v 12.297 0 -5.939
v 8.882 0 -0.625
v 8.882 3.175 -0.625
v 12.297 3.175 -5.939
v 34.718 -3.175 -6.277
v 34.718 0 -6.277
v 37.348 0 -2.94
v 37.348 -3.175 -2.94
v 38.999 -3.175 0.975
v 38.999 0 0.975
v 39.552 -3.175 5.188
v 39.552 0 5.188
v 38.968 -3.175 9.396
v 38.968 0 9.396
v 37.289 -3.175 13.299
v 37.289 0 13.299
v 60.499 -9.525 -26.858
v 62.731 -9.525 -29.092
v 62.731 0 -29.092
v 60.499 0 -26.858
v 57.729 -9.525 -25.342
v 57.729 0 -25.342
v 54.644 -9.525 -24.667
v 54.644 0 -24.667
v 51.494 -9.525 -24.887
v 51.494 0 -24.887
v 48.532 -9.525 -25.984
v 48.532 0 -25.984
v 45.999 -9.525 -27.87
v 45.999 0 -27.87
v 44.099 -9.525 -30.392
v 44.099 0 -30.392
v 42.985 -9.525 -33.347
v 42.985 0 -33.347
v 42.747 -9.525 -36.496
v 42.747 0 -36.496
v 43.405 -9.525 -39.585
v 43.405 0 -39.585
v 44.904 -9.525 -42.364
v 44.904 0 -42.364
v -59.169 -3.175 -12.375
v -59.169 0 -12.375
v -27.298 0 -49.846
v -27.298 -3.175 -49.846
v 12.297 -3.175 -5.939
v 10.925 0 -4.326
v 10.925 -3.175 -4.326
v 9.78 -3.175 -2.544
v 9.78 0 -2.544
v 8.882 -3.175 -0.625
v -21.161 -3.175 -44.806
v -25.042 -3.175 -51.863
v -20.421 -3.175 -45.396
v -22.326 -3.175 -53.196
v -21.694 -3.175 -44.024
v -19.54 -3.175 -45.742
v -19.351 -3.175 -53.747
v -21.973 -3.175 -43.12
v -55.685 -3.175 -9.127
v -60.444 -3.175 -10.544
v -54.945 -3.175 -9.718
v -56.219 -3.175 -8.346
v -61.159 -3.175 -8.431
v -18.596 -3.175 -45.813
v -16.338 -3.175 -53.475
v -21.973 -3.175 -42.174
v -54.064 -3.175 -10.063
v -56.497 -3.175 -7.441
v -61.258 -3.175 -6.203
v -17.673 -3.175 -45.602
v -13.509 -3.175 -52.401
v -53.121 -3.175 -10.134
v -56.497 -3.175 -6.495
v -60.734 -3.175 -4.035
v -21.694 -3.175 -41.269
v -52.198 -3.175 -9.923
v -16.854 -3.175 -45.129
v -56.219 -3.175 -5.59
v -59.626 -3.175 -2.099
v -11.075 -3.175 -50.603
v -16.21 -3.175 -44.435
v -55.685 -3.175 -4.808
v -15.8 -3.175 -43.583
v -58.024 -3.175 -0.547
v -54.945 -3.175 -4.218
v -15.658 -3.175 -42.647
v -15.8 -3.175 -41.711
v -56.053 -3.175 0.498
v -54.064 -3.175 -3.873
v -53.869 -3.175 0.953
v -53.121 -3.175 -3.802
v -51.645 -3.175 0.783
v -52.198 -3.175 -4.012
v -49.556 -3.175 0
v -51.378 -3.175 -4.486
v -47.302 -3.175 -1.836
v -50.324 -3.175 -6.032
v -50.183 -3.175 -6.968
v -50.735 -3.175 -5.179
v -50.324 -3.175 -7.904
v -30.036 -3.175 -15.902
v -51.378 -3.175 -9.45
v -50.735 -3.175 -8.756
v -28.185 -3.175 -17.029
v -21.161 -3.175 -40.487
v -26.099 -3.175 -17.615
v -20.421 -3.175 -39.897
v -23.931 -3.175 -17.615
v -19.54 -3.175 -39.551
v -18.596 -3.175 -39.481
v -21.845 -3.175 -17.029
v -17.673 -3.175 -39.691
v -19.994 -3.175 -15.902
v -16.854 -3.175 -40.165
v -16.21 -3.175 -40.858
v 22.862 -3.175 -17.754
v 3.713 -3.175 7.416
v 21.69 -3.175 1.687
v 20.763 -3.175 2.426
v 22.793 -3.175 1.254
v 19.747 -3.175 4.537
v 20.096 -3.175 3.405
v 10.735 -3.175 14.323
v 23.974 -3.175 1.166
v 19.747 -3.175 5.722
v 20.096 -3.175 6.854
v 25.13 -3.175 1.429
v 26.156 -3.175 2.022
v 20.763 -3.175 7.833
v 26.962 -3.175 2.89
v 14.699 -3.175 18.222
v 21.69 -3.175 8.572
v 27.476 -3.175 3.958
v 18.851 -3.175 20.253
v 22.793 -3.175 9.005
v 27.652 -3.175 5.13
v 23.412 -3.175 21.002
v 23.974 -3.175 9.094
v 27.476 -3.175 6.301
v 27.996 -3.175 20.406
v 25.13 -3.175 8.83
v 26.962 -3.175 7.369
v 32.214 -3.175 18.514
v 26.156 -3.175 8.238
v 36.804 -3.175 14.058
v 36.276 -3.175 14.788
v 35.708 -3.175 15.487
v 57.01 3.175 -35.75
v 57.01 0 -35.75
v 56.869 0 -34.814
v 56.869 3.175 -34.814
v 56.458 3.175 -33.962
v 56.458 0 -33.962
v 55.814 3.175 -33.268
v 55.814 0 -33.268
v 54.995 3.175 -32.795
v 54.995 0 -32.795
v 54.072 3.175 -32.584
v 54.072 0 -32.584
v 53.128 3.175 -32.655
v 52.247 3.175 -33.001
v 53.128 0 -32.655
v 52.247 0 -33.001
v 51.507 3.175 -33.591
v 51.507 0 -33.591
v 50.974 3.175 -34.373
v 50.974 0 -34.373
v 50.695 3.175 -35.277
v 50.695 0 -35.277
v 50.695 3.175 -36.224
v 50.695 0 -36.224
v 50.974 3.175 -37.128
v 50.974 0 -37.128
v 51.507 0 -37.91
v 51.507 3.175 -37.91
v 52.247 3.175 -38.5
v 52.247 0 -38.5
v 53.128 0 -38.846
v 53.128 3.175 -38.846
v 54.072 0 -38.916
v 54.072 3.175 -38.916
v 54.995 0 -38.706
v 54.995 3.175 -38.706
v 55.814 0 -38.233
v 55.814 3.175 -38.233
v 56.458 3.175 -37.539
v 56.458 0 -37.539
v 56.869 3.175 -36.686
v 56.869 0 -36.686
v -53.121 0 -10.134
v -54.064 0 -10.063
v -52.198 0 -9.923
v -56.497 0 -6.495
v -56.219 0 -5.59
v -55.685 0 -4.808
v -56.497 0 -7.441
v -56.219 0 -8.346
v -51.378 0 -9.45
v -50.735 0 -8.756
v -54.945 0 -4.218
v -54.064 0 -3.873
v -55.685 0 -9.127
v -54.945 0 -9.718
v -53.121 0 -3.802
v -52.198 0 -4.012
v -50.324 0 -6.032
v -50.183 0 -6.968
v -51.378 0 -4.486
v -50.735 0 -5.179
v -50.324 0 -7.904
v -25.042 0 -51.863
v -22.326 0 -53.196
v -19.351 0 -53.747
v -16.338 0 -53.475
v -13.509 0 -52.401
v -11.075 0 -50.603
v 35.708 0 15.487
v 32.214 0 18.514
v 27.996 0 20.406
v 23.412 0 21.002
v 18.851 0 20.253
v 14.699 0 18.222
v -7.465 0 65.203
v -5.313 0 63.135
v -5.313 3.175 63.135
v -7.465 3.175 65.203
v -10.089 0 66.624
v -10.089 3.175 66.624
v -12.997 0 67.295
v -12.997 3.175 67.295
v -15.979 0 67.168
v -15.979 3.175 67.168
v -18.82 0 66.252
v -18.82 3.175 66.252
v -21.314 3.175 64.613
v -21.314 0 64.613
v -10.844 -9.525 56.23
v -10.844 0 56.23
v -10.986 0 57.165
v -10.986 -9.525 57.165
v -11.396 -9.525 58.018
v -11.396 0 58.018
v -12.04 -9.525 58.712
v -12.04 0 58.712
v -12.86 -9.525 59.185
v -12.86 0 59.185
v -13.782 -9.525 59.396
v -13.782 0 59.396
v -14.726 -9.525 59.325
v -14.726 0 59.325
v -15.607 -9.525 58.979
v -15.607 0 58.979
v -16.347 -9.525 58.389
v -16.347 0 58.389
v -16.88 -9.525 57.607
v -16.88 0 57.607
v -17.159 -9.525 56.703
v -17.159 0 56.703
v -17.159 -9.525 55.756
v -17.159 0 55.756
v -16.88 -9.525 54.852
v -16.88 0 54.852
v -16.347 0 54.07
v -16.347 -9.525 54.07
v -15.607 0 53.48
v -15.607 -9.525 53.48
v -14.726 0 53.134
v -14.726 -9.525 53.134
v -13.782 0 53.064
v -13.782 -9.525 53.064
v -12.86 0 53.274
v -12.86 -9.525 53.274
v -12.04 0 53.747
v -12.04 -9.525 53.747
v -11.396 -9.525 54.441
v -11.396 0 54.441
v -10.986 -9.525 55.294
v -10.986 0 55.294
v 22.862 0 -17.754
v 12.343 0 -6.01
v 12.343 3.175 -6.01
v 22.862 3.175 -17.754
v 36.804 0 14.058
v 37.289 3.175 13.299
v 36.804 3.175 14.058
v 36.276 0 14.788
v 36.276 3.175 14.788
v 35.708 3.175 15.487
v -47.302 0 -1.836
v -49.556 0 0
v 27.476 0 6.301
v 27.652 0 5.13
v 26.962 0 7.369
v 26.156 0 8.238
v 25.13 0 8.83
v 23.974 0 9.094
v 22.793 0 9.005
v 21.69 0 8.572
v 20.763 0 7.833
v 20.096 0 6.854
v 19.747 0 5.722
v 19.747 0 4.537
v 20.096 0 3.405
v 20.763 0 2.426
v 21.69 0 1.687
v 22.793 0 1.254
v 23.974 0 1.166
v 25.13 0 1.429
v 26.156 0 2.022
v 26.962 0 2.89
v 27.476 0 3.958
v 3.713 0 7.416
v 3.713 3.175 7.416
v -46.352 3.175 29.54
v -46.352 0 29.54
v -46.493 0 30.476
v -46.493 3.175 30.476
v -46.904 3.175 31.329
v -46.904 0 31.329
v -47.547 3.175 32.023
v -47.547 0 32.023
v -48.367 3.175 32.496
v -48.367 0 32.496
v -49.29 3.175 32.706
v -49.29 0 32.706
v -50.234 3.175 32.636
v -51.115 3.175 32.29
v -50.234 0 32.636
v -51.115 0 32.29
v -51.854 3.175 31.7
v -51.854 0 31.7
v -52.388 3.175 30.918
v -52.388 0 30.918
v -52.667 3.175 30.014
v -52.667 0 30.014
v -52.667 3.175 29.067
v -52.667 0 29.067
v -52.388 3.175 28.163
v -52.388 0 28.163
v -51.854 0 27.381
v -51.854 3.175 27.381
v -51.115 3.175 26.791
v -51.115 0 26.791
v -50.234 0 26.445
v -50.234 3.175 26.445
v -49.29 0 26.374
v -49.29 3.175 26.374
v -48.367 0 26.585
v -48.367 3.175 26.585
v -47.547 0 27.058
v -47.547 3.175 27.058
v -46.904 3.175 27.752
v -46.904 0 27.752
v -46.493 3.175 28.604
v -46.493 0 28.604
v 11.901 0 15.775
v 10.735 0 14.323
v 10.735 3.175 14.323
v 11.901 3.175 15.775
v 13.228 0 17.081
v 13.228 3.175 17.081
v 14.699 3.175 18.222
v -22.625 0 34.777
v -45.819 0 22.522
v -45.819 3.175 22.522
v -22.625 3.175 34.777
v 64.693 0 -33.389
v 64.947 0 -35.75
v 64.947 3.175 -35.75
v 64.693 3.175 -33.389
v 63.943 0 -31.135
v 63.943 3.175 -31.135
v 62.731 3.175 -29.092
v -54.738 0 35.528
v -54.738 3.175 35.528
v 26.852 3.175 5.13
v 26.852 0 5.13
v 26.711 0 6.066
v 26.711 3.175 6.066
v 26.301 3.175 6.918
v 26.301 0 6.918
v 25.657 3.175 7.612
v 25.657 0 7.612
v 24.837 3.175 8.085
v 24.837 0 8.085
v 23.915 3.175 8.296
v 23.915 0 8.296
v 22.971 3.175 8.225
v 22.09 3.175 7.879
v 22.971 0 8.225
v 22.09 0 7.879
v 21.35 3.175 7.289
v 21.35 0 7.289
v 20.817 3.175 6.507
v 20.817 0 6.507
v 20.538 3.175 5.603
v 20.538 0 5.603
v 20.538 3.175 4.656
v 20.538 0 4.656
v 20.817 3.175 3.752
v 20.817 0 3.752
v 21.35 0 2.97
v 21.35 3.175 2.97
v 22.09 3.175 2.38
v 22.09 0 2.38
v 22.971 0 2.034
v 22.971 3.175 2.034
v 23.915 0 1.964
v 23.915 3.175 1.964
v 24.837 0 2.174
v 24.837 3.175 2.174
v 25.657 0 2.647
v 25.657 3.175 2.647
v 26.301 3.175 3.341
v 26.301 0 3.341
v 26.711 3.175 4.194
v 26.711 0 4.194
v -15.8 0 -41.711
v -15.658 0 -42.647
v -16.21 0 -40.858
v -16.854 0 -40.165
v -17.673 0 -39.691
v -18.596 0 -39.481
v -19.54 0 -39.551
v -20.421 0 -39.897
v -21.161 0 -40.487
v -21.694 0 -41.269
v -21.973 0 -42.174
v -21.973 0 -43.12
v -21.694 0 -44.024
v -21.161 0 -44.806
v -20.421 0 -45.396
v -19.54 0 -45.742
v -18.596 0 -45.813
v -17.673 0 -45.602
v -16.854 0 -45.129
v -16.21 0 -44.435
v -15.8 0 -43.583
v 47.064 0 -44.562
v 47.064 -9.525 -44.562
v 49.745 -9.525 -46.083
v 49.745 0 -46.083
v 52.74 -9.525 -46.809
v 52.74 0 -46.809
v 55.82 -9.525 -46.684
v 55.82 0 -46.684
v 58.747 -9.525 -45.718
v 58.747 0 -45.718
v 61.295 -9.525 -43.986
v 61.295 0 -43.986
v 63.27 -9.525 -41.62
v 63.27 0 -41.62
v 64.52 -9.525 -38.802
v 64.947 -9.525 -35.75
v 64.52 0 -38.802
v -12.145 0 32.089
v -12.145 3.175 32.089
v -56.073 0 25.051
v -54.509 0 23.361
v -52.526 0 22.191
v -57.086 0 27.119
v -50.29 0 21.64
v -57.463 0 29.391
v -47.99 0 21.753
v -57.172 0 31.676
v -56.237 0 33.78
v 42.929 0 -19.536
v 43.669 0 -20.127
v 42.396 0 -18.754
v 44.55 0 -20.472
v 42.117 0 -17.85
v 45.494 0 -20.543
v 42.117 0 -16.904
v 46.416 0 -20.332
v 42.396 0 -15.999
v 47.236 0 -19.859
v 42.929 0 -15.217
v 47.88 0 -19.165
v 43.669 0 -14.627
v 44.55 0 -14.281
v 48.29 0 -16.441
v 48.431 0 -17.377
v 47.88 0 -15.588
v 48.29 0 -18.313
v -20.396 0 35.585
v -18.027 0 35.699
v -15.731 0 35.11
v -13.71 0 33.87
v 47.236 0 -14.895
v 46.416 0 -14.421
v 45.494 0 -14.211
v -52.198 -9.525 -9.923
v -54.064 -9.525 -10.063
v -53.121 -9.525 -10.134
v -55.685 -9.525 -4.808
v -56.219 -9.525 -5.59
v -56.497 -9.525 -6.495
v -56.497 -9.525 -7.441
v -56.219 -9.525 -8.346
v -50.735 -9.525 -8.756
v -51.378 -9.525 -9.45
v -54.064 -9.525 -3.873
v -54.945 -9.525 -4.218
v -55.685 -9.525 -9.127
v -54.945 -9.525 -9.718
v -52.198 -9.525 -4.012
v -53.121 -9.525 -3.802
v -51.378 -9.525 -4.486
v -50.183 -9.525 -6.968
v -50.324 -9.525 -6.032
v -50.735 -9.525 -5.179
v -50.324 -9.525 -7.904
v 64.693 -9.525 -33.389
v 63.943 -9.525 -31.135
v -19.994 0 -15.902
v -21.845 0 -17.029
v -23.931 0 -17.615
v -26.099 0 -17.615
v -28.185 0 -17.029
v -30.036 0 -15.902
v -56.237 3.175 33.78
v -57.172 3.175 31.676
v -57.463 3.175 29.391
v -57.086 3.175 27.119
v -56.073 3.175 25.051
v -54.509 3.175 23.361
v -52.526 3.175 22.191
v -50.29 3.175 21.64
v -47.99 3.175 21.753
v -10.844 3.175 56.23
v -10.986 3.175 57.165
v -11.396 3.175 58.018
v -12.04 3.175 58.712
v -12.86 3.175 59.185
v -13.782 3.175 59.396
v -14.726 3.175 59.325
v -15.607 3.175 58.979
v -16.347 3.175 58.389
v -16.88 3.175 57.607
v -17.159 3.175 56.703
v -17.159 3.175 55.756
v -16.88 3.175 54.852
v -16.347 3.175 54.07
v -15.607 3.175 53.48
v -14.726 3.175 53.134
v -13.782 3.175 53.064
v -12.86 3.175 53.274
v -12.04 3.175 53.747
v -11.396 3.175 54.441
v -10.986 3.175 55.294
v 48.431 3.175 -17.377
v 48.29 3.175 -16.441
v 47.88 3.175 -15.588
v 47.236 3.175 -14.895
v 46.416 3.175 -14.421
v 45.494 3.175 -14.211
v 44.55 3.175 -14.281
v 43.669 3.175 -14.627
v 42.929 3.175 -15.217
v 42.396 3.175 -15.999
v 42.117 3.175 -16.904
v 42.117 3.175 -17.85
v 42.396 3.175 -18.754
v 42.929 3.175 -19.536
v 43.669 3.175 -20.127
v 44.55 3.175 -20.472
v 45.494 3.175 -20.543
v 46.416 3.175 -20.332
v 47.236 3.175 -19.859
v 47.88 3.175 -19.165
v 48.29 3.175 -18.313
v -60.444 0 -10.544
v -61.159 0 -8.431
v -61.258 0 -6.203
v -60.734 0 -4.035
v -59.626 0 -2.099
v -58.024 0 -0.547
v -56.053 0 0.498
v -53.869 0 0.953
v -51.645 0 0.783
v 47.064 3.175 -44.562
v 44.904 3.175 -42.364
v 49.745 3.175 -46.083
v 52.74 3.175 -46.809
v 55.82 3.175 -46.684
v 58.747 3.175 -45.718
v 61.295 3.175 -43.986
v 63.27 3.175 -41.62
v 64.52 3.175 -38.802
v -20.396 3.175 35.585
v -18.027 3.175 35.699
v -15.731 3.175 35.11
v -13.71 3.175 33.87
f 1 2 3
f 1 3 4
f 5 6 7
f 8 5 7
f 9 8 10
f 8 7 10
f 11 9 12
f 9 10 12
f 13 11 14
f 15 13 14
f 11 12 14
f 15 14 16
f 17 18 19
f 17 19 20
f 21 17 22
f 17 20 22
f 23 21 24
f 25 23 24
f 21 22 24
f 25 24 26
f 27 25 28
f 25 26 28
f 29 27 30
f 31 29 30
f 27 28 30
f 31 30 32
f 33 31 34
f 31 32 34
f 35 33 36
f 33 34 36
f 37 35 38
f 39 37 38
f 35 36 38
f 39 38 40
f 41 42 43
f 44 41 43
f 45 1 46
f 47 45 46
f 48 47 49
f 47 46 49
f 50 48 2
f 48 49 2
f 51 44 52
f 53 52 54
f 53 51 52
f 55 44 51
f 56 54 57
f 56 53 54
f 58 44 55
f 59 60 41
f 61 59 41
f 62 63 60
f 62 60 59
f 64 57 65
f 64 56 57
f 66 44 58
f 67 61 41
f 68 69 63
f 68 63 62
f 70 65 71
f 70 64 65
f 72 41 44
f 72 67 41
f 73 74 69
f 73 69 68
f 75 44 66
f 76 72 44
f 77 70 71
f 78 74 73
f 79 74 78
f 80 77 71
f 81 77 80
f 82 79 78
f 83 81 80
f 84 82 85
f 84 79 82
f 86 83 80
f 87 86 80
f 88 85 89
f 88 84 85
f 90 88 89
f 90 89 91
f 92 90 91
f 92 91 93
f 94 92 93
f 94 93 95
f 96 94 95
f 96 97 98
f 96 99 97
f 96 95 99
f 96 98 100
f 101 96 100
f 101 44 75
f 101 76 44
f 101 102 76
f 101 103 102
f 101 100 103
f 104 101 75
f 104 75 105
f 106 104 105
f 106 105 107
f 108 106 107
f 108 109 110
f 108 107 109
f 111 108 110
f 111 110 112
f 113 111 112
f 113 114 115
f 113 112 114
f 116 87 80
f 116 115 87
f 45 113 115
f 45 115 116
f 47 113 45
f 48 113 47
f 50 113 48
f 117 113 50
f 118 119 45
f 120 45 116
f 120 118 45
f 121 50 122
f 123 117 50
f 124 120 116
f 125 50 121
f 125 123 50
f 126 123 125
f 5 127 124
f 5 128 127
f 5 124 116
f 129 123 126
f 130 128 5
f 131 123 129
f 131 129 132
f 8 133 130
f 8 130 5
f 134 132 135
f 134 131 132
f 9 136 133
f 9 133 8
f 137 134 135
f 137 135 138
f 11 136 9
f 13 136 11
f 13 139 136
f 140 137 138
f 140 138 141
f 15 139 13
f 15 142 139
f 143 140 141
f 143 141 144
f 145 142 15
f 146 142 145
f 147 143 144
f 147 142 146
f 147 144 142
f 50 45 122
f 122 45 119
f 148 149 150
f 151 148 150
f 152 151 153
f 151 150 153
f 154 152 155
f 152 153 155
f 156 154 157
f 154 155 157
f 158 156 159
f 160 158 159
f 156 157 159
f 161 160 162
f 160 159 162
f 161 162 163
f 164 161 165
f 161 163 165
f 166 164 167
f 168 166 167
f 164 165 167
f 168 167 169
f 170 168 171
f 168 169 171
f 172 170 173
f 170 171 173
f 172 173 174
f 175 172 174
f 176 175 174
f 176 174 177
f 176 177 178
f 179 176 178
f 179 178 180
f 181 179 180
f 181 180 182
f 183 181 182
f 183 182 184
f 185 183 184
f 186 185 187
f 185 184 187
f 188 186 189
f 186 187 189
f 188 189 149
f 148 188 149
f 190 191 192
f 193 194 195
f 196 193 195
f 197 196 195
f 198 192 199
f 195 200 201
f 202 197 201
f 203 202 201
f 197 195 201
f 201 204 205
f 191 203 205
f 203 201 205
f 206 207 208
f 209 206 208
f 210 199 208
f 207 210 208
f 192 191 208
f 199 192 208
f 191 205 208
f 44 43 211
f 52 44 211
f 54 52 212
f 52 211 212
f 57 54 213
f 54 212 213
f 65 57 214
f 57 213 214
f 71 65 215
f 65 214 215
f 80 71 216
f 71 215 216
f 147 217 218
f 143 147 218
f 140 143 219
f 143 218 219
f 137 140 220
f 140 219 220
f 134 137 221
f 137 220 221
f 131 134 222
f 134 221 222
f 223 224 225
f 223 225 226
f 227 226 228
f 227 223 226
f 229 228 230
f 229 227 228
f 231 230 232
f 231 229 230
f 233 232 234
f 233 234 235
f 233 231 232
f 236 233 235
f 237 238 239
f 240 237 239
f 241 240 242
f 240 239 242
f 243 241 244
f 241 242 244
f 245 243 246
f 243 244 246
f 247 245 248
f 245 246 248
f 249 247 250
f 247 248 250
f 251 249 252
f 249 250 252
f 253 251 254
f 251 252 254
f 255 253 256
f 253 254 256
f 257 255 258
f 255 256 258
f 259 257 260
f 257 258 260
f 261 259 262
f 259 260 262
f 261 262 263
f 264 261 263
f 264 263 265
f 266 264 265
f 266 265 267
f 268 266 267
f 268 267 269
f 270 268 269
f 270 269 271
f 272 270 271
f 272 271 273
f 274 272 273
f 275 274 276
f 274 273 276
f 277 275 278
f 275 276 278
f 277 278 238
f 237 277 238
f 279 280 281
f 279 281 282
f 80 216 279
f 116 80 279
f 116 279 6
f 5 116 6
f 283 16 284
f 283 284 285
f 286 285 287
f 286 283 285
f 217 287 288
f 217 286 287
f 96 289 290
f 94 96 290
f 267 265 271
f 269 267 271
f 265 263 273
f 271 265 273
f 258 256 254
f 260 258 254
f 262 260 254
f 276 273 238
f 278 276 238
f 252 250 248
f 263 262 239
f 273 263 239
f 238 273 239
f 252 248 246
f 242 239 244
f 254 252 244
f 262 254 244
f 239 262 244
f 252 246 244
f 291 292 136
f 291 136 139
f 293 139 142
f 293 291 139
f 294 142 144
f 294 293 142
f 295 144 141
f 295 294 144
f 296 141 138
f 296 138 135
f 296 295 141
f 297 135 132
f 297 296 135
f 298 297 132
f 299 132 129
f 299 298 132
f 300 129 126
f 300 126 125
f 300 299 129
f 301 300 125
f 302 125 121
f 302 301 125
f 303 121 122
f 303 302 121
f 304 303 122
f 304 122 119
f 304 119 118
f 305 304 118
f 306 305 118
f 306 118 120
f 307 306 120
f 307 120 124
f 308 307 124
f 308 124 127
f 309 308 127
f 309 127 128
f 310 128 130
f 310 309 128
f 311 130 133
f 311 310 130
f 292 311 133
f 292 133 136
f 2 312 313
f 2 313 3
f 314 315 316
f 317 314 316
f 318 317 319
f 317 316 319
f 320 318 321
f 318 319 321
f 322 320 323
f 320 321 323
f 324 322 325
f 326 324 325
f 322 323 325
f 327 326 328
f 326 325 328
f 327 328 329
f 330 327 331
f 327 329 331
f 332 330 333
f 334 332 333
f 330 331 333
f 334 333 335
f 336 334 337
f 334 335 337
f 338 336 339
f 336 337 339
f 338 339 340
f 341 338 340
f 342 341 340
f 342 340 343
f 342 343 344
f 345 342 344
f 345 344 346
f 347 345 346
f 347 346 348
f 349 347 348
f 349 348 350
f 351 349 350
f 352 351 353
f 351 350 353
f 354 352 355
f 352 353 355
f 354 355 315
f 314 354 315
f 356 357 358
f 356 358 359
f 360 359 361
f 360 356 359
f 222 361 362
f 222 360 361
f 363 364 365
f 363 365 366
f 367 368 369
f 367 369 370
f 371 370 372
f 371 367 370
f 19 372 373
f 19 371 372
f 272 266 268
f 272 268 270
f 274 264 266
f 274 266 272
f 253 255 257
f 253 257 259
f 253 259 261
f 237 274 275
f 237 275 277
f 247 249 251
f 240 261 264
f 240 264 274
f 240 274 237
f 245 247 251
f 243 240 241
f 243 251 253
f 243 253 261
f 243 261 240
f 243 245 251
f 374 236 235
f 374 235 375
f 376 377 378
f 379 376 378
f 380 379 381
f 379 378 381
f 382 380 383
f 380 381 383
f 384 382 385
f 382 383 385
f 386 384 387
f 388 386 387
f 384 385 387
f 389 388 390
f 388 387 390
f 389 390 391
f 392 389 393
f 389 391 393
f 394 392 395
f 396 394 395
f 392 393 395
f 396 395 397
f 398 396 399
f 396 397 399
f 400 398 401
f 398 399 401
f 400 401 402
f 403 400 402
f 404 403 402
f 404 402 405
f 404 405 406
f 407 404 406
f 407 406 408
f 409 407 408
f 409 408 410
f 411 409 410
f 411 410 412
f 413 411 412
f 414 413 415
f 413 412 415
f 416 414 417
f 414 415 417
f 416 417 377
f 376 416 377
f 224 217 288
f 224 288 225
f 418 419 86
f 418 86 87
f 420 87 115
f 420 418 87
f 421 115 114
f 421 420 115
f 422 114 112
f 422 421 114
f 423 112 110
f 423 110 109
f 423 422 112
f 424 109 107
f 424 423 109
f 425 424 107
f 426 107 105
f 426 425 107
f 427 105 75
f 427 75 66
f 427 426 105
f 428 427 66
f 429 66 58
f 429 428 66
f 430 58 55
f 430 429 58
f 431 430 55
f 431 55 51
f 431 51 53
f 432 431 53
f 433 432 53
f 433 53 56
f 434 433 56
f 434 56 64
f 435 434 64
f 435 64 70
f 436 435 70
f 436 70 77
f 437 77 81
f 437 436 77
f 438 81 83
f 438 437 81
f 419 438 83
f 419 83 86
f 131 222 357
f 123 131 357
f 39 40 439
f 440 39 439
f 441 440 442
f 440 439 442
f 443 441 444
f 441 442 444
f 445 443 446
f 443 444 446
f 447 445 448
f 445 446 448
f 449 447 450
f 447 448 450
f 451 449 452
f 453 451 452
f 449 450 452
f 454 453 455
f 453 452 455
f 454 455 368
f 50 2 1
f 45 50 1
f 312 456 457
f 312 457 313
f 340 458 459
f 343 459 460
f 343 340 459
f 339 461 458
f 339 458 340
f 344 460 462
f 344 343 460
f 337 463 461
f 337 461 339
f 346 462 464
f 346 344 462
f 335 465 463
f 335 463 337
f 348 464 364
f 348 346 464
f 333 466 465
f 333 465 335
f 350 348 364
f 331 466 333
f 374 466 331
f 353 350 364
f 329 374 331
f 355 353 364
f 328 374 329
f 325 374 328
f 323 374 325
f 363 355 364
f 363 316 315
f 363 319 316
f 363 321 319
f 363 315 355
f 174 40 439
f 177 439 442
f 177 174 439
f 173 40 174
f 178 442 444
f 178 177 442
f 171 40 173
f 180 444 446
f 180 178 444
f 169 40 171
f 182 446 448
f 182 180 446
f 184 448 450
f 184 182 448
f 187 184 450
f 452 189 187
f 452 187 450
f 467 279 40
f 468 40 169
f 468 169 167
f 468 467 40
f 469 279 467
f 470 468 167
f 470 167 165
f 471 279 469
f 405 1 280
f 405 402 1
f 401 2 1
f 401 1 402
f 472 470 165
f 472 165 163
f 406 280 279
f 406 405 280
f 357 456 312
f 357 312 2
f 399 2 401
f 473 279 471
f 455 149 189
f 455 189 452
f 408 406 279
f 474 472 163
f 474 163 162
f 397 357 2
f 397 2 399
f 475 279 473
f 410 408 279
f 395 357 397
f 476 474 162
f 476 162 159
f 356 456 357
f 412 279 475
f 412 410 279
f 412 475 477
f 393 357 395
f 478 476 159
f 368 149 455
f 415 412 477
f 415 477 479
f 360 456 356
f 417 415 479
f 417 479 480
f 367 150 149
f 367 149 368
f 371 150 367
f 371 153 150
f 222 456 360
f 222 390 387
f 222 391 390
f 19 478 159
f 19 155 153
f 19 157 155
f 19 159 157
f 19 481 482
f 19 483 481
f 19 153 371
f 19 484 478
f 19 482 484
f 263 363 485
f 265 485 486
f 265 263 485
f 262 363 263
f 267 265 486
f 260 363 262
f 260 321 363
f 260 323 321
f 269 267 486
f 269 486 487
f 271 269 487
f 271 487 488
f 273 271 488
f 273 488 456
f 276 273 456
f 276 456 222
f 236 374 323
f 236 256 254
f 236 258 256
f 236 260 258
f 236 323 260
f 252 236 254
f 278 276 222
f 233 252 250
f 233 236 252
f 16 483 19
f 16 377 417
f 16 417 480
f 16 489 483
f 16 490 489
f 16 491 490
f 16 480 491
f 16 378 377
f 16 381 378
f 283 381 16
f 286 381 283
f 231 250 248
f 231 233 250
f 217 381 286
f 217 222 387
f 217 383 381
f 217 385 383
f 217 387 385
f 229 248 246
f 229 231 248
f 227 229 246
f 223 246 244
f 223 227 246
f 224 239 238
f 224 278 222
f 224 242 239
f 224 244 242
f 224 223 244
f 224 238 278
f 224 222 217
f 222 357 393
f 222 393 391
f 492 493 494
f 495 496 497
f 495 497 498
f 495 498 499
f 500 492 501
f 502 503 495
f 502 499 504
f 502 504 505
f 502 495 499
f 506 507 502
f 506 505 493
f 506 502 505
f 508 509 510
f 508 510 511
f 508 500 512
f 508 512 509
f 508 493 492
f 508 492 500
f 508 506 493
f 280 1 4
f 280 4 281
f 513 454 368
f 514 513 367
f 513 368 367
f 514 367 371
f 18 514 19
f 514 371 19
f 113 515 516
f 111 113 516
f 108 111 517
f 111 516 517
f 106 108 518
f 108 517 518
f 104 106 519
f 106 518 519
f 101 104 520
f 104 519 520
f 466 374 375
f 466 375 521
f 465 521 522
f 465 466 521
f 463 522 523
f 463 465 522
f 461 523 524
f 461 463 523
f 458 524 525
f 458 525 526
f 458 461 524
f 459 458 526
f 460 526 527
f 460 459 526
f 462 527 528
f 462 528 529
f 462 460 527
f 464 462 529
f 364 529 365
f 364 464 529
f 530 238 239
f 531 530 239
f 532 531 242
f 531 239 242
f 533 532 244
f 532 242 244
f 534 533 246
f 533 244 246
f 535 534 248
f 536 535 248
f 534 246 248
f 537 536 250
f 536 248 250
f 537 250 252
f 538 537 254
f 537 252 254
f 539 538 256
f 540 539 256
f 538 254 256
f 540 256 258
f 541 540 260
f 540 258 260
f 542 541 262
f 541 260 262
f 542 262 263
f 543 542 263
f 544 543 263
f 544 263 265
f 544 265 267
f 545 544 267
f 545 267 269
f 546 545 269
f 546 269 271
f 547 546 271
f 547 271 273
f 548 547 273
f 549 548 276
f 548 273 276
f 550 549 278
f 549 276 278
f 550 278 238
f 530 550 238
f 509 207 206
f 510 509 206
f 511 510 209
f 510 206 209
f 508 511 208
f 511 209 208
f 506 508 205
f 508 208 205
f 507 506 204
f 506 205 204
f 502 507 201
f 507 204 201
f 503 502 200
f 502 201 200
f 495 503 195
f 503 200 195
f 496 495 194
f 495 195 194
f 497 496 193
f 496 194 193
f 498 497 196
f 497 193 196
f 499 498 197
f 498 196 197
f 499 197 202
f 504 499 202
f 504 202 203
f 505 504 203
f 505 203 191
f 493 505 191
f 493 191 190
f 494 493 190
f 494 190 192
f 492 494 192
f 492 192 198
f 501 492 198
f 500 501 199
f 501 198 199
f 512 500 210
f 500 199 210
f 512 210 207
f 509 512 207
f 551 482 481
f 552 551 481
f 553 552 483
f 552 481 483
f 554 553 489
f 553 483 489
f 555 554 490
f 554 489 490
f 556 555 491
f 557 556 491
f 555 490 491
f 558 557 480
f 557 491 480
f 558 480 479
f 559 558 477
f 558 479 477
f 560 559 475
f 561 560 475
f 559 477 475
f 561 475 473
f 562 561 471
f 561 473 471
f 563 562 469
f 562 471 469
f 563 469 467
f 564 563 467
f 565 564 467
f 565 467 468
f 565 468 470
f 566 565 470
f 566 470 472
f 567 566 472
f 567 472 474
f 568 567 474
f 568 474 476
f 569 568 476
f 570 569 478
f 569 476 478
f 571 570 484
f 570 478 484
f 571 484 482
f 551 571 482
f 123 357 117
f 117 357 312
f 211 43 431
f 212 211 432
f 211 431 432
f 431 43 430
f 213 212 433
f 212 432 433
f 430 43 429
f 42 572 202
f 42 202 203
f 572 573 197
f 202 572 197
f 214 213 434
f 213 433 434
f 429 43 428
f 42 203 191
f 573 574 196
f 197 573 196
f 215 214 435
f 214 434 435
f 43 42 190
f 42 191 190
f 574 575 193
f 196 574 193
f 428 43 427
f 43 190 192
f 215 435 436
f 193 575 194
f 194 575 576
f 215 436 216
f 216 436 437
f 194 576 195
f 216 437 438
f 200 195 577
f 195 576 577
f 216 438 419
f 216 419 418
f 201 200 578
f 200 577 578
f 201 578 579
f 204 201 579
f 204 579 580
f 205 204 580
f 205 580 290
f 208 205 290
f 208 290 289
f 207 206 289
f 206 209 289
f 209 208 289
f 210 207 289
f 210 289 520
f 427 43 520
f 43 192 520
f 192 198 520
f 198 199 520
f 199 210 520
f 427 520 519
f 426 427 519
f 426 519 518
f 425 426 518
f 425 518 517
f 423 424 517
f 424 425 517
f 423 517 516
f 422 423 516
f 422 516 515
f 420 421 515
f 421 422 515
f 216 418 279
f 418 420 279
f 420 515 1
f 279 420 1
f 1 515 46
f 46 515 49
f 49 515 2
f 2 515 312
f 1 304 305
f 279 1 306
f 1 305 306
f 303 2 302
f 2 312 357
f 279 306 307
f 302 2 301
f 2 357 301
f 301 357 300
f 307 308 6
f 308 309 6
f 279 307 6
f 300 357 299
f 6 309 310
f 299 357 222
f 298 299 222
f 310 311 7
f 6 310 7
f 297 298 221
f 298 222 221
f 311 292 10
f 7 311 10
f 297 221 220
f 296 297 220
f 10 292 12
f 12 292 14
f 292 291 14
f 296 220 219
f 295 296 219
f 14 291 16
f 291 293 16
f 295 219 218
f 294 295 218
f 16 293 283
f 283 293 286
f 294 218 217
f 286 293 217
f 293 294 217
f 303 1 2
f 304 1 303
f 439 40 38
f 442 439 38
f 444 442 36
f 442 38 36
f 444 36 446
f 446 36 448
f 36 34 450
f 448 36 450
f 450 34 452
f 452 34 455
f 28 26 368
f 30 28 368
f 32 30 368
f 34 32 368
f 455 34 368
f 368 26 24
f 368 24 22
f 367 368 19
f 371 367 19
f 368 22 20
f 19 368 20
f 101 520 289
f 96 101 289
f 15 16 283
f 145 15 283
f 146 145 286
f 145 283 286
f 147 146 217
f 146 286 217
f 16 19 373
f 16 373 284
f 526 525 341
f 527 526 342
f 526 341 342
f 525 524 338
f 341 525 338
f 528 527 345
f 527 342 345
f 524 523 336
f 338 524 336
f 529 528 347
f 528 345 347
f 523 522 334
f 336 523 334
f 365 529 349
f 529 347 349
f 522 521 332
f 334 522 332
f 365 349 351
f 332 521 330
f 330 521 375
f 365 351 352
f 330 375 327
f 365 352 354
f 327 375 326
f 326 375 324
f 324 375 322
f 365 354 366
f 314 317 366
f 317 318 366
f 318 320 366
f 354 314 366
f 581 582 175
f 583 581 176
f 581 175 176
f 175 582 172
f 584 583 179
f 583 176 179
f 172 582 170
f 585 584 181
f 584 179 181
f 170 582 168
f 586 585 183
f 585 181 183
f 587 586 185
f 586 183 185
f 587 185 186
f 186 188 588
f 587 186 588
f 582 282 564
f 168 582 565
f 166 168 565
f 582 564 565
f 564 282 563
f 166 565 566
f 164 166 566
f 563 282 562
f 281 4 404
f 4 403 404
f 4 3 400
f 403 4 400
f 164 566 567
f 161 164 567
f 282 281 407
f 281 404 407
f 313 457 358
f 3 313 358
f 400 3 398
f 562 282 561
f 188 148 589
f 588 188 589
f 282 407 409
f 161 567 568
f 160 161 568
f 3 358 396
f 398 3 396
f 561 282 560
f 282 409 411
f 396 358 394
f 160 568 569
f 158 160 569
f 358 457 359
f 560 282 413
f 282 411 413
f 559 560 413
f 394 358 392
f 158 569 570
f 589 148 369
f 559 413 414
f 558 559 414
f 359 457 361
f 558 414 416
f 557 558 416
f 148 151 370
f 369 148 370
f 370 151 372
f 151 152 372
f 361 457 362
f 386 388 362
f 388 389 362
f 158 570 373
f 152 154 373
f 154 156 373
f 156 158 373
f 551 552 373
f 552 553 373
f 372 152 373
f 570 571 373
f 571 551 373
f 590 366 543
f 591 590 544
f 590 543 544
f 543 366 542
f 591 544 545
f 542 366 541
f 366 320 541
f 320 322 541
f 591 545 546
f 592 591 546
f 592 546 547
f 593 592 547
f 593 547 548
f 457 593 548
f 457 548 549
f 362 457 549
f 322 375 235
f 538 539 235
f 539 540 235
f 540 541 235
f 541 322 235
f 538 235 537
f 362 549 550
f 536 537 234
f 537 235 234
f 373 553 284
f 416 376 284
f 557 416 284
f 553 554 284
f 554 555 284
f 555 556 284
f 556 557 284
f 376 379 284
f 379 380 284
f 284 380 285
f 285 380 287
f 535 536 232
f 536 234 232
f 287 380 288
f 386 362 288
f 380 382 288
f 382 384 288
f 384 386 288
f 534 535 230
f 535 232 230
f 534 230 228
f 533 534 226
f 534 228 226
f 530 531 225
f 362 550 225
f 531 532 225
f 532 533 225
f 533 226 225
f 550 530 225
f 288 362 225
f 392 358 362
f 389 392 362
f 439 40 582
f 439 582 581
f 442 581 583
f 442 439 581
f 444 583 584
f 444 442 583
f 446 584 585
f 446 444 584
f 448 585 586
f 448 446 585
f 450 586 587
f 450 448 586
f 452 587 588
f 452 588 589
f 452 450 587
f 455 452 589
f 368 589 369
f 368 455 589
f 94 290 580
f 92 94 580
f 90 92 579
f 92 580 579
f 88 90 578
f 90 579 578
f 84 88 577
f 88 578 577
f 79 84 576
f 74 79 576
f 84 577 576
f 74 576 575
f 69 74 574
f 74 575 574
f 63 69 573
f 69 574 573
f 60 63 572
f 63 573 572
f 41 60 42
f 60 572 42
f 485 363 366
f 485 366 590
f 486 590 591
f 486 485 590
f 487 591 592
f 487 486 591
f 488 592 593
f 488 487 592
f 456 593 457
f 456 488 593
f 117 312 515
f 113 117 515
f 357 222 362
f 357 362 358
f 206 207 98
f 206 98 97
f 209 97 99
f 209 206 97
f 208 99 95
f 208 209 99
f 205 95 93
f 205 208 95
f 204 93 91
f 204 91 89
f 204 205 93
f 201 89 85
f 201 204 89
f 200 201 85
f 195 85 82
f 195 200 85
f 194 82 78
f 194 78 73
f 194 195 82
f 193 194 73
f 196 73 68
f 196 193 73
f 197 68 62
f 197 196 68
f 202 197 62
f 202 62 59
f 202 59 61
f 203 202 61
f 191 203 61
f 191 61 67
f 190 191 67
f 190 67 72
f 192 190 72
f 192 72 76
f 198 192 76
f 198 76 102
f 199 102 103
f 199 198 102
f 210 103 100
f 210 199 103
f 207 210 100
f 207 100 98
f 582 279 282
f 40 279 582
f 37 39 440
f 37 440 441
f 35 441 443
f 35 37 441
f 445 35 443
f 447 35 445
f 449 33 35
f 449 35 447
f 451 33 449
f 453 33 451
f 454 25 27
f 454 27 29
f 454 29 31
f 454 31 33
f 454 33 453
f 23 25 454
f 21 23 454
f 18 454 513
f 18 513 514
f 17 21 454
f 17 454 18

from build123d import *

# Parameters (mm, degrees)
F0_R     = 3.9751
F0_R_2   = 3.175
F1_DEPTH = 3.175
F2_DEPTH = 3.175
F4_DEPTH = 9.525


with BuildPart() as f1:
    # F0 (on Front) → F1 (new body)
    with BuildSketch(Plane.XZ):
        with BuildLine():
            ThreePointArc((-5.3127557425, 63.1347790551), (-3.525631751, 59.8857583818), (-2.9069614474, 56.2296409669))
            ThreePointArc((-2.9069614474, 56.2296409669), (-18.6251583345, 46.116520161), (-21.3141987809, 64.6126275161))
            Line((-21.3141987809, 64.6126275161), (-54.737529258, 35.5281937994))
            ThreePointArc((-54.737529258, 35.5281937994), (-46.2372191005, 36.7640039827), (-41.5895025912, 29.5403462642))
            ThreePointArc((-41.5895025912, 29.5403462642), (-42.7285574594, 25.4433900722), (-45.8188065382, 22.5222846884))
            Line((-45.8188065382, 22.5222846884), (-22.625150159, 34.7773246467))
            ThreePointArc((-22.625150159, 34.7773246467), (-16.8569045119, 35.4909788107), (-12.144523957, 32.088710506))
            Line((-12.144523957, 32.088710506), (3.7133936542, 7.4163528596))
            Line((3.7133936542, 7.4163528596), (10.7353477508, 14.3232909653))
            ThreePointArc((10.7353477508, 14.3232909653), (12.5449977515, 16.4472846117), (14.6985856273, 18.2216130469))
            ThreePointArc((14.6985856273, 18.2216130469), (25.7261792861, 20.8718790141), (35.7079737596, 15.487131045))
            Line((35.7079737596, 15.487131045), (-5.3127557425, 63.1347790551))
        make_face()
        with BuildLine():
            ThreePointArc((37.2888219021, 13.2991536525), (36.5449865014, 14.4268033973), (35.7079737596, 15.487131045))
            ThreePointArc((35.7079737596, 15.487131045), (25.7261792861, 20.8718790141), (14.6985856273, 18.2216130469))
            Line((14.6985856273, 18.2216130469), (10.7353477508, 14.3232909653))
            ThreePointArc((10.7353477508, 14.3232909653), (7.9228485059, 7.0827485045), (8.8821439076, -0.6253874221))
            Line((8.8821439076, -0.6253874221), (12.2974068631, -5.9389847782))
            ThreePointArc((12.2974068631, -5.9389847782), (23.4379734075, -10.743537999), (34.718293483, -6.2769583705))
            ThreePointArc((34.718293483, -6.2769583705), (38.2938852735, -1.0646535641), (39.5522467868, 5.1296586938))
            ThreePointArc((39.5522467868, 5.1296586938), (38.9759294091, 9.3682828836), (37.2888219021, 13.2991536525))
        make_face()
        with Locations((23.6772467868, 5.1296586938)):
            Circle(F0_R, mode=Mode.SUBTRACT)
        with BuildLine():
            Line((62.7313325952, -29.0917955033), (37.2888219021, 13.2991536525))
            ThreePointArc((37.2888219021, 13.2991536525), (38.9759294091, 9.3682828836), (39.5522467868, 5.1296586938))
            ThreePointArc((39.5522467868, 5.1296586938), (38.2938852735, -1.0646535641), (34.718293483, -6.2769583705))
            Line((34.718293483, -6.2769583705), (22.861570702, -17.7536858036))
            Line((22.861570702, -17.7536858036), (44.9044808209, -42.3639788264))
            ThreePointArc((44.9044808209, -42.3639788264), (47.1985006827, -26.8368729907), (62.7313325952, -29.0917955033))
        make_face()
        with Locations((45.2562570572, -17.3768736422)):
            Circle(F0_R_2, mode=Mode.SUBTRACT)
        with BuildLine():
            ThreePointArc((64.9471133741, -35.7503271246), (64.3786270453, -32.2415621064), (62.7313325952, -29.0917955033))
            ThreePointArc((62.7313325952, -29.0917955033), (47.1985006827, -26.8368729907), (44.9044808209, -42.3639788264))
            ThreePointArc((44.9044808209, -42.3639788264), (57.3168223176, -46.3031408311), (64.9471133741, -35.7503271246))
        make_face()
        with Locations((53.8346133741, -35.7503271246)):
            Circle(F0_R_2, mode=Mode.SUBTRACT)
        with BuildLine():
            ThreePointArc((-21.3141987809, 64.6126275161), (-18.6251583345, 46.116520161), (-2.9069614474, 56.2296409669))
            ThreePointArc((-2.9069614474, 56.2296409669), (-3.525631751, 59.8857583818), (-5.3127557425, 63.1347790551))
            ThreePointArc((-5.3127557425, 63.1347790551), (-12.9974914435, 67.295048034), (-21.3141987809, 64.6126275161))
        make_face()
        with Locations((-14.0194614474, 56.2296409669)):
            Circle(F0_R_2, mode=Mode.SUBTRACT)
        with BuildLine():
            ThreePointArc((-41.5895025912, 29.5403462642), (-46.2372191005, 36.7640039827), (-54.737529258, 35.5281937994))
            ThreePointArc((-54.737529258, 35.5281937994), (-56.0731974607, 25.0513331231), (-45.8188065382, 22.5222846884))
            ThreePointArc((-45.8188065382, 22.5222846884), (-42.7285574594, 25.4433900722), (-41.5895025912, 29.5403462642))
        make_face()
        with Locations((-49.5270025912, 29.5403462642)):
            Circle(F0_R_2, mode=Mode.SUBTRACT)
        with BuildLine():
            Line((22.861570702, -17.7536858036), (34.718293483, -6.2769583705))
            ThreePointArc((34.718293483, -6.2769583705), (23.4379734075, -10.743537999), (12.2974068631, -5.9389847782))
            Line((12.2974068631, -5.9389847782), (12.3431713564, -6.0101869358))
            Line((12.3431713564, -6.0101869358), (22.861570702, -17.7536858036))
        make_face()
        with Locations((23.6772467868, 5.1296586938)):
            Circle(F0_R)
        with Locations((23.6772467868, 5.1296586938)):
            Circle(F0_R_2, mode=Mode.SUBTRACT)
        with BuildLine():
            ThreePointArc((8.8821439076, -0.6253874221), (7.9228485059, 7.0827485045), (10.7353477508, 14.3232909653))
            Line((10.7353477508, 14.3232909653), (3.7133936542, 7.4163528596))
            Line((3.7133936542, 7.4163528596), (8.8821439076, -0.6253874221))
        make_face()
    extrude(amount=-F1_DEPTH)


with BuildPart() as f2:
    # F0 (on Front) → F2 (new body)
    with BuildSketch(Plane.XZ):
        with BuildLine():
            ThreePointArc((37.2888219021, 13.2991536525), (36.5449865014, 14.4268033973), (35.7079737596, 15.487131045))
            ThreePointArc((35.7079737596, 15.487131045), (25.7261792861, 20.8718790141), (14.6985856273, 18.2216130469))
            Line((14.6985856273, 18.2216130469), (10.7353477508, 14.3232909653))
            ThreePointArc((10.7353477508, 14.3232909653), (7.9228485059, 7.0827485045), (8.8821439076, -0.6253874221))
            Line((8.8821439076, -0.6253874221), (12.2974068631, -5.9389847782))
            ThreePointArc((12.2974068631, -5.9389847782), (23.4379734075, -10.743537999), (34.718293483, -6.2769583705))
            ThreePointArc((34.718293483, -6.2769583705), (38.2938852735, -1.0646535641), (39.5522467868, 5.1296586938))
            ThreePointArc((39.5522467868, 5.1296586938), (38.9759294091, 9.3682828836), (37.2888219021, 13.2991536525))
        make_face()
        with Locations((23.6772467868, 5.1296586938)):
            Circle(F0_R, mode=Mode.SUBTRACT)
        with BuildLine():
            ThreePointArc((8.8821439076, -0.6253874221), (7.9228485059, 7.0827485045), (10.7353477508, 14.3232909653))
            Line((10.7353477508, 14.3232909653), (3.7133936542, 7.4163528596))
            Line((3.7133936542, 7.4163528596), (8.8821439076, -0.6253874221))
        make_face()
        with BuildLine():
            Line((22.861570702, -17.7536858036), (34.718293483, -6.2769583705))
            ThreePointArc((34.718293483, -6.2769583705), (23.4379734075, -10.743537999), (12.2974068631, -5.9389847782))
            Line((12.2974068631, -5.9389847782), (12.3431713564, -6.0101869358))
            Line((12.3431713564, -6.0101869358), (22.861570702, -17.7536858036))
        make_face()
        with BuildLine():
            ThreePointArc((12.2974068631, -5.9389847782), (10.3228285329, -3.45376359), (8.8821439076, -0.6253874221))
            Line((8.8821439076, -0.6253874221), (3.7133936542, 7.4163528596))
            Line((3.7133936542, 7.4163528596), (-19.9936484697, -15.9023801261))
            ThreePointArc((-19.9936484697, -15.9023801261), (-25.0150598586, -17.6888874259), (-30.0364712475, -15.9023801261))
            Line((-30.0364712475, -15.9023801261), (-47.3022995151, -1.8363273688))
            ThreePointArc((-47.3022995151, -1.8363273688), (-45.9057292748, -4.2350360326), (-45.4204246014, -6.9679266385))
            ThreePointArc((-45.4204246014, -6.9679266385), (-50.4530203401, -14.3547688247), (-59.1691962507, -12.3746842684))
            Line((-59.1691962507, -12.3746842684), (-27.2982812561, -49.8464654343))
            ThreePointArc((-27.2982812561, -49.8464654343), (-25.8826153725, -34.0563496428), (-10.1199282001, -35.7503271246))
            ThreePointArc((-10.1199282001, -35.7503271246), (-8.3378155575, -38.995927856), (-7.7209494347, -42.6468627726))
            ThreePointArc((-7.7209494347, -42.6468627726), (-8.3378155575, -46.2977976891), (-10.1199282001, -49.5433984205))
            ThreePointArc((-10.1199282001, -49.5433984205), (-10.5806264467, -50.0885406061), (-11.0753700137, -50.6029836833))
            Line((-11.0753700137, -50.6029836833), (22.861570702, -17.7536858036))
            Line((22.861570702, -17.7536858036), (12.3431713564, -6.0101869358))
            Line((12.3431713564, -6.0101869358), (12.2974068631, -5.9389847782))
        make_face()
        with BuildLine():
            Line((-10.1199282001, -35.7503271246), (-10.1199282001, -49.5433984205))
            ThreePointArc((-10.1199282001, -49.5433984205), (-8.3378155575, -46.2977976891), (-7.7209494347, -42.6468627726))
            ThreePointArc((-7.7209494347, -42.6468627726), (-8.3378155575, -38.995927856), (-10.1199282001, -35.7503271246))
        make_face()
        with BuildLine():
            ThreePointArc((-27.2982812561, -49.8464654343), (-19.3510928488, -53.7472997705), (-11.0753700137, -50.6029836833))
            ThreePointArc((-11.0753700137, -50.6029836833), (-10.5806264467, -50.0885406061), (-10.1199282001, -49.5433984205))
            Line((-10.1199282001, -49.5433984205), (-10.1199282001, -35.7503271246))
            ThreePointArc((-10.1199282001, -35.7503271246), (-25.8826153725, -34.0563496428), (-27.2982812561, -49.8464654343))
        make_face()
        with Locations((-18.8334494347, -42.6468627726)):
            Circle(F0_R_2, mode=Mode.SUBTRACT)
        with BuildLine():
            ThreePointArc((-45.4204246014, -6.9679266385), (-45.9057292748, -4.2350360326), (-47.3022995151, -1.8363273688))
            Line((-47.3022995151, -1.8363273688), (-49.556358528, 0))
            ThreePointArc((-49.556358528, 0), (-59.6263320396, -2.0985350504), (-59.1691962507, -12.3746842684))
            ThreePointArc((-59.1691962507, -12.3746842684), (-50.4530203401, -14.3547688247), (-45.4204246014, -6.9679266385))
        make_face()
        with Locations((-53.3579246014, -6.9679266385)):
            Circle(F0_R_2, mode=Mode.SUBTRACT)
    extrude(amount=F2_DEPTH)


with BuildPart() as f4:
    # F0 (on Front) → F4 (new body, through all)
    with BuildSketch(Plane.XZ):
        with Locations((-14.0194614474, 56.2296409669)):
            Circle(F0_R_2)
    extrude(amount=F4_DEPTH)


with BuildPart() as f4b:
    # F0 (on Front) → F4, piece 2 (new body, through all)
    with BuildSketch(Plane.XZ):
        with BuildLine():
            ThreePointArc((64.9471133741, -35.7503271246), (64.3786270453, -32.2415621064), (62.7313325952, -29.0917955033))
            ThreePointArc((62.7313325952, -29.0917955033), (47.1985006827, -26.8368729907), (44.9044808209, -42.3639788264))
            ThreePointArc((44.9044808209, -42.3639788264), (57.3168223176, -46.3031408311), (64.9471133741, -35.7503271246))
        make_face()
        with Locations((53.8346133741, -35.7503271246)):
            Circle(F0_R_2, mode=Mode.SUBTRACT)
        with Locations((53.8346133741, -35.7503271246)):
            Circle(F0_R_2)
    extrude(amount=F4_DEPTH)


with BuildPart() as f4c:
    # F0 (on Front) → F4, piece 3 (new body, through all)
    with BuildSketch(Plane.XZ):
        with Locations((-53.3579246014, -6.9679266385)):
            Circle(F0_R_2)
    extrude(amount=F4_DEPTH)


solid = Compound([f1.part, f2.part, f4.part, f4b.part, f4c.part])
